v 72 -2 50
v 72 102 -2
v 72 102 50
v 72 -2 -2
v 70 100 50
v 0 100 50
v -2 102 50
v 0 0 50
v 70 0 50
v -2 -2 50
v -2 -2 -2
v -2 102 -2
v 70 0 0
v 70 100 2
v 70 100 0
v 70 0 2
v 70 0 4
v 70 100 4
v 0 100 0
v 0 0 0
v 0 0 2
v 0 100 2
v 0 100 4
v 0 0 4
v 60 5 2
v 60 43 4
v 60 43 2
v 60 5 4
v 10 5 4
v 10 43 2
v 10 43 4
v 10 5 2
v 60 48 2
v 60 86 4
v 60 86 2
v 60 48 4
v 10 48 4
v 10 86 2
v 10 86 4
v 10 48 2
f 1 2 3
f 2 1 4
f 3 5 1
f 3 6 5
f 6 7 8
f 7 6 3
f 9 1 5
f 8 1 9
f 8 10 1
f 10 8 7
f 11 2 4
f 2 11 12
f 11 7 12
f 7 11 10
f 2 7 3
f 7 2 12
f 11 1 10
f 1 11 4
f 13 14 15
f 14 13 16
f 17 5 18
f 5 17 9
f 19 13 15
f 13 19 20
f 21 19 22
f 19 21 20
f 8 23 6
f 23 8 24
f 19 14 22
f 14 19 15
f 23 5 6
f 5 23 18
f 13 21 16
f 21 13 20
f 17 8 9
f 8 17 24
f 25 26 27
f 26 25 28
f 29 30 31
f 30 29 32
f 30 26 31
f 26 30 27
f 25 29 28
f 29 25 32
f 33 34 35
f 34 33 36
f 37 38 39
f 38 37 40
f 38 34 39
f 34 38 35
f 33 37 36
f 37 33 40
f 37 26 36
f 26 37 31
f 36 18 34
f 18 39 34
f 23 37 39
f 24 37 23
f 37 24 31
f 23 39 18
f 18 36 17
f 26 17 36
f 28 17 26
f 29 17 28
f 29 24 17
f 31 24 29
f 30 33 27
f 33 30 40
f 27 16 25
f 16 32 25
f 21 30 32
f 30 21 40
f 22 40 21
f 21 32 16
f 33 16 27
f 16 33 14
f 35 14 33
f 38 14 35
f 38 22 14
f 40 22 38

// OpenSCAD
/* enclosure (inner dimensions): */
L = 100;
W = 70;
H = 50;
WT = 2; /* wall thickness */
RT = 2; /* rim thickness */

/* PCBs: */
PCB_L = 50;
PCB_W = 38;
PCB1_T = 15;
PCB2_T = 35;
PCB1_YO = 5; /* Y offset */
PCB2_YO = PCB_W + 10; /* Y offset */

/* voltmeter module: */
VM_W = 45;
VM_H = 26;
VM_D = 20;
VM_XO = 5; /* X offset */
VM_YO = 5; /* Y offset */


module PCB(c, t) {
    color(c) cube([PCB_L, PCB_W, t]);
}

module PCBs() {
    translate([(W-PCB_L)/2,PCB1_YO,0]) PCB("red", PCB1_T);
    translate([(W-PCB_L)/2,PCB2_YO,0]) PCB("brown", PCB2_T);
}

module bottom() {
    /* enclosure (without top): */
    difference() {
        translate([-WT,-WT,-WT]) cube([W+2*WT,L+2*WT,H+WT]);
        cube([W,L,H+1]);
    }
    /* rim around PCBs: */
    difference() {
        translate([0,0,WT]) cube([W,L,RT]);
        PCBs();
    }
}

module top() {
    translate([0,0,H]) linear_extrude(WT) difference() {
         translate([-WT,-WT]) square([W+2*WT,L+2*WT]);
        /* voltmeter hole: */
        translate([VM_XO,VM_YO]) square([VM_H,VM_W]);
    }
    /* TODO: holes for voltmeter and switches */
    /* TODO: hold PCBs down? */
}


!bottom();
top();
/* TODO: how to connect top and bottom? */
/* TODO: add holes for cables and strain relief */

/* PCBs: */
PCBs();
/* volmeter module: */
translate([VM_XO,VM_YO,H-VM_D+WT]) color("gray") cube([VM_H,VM_W,VM_D]);
